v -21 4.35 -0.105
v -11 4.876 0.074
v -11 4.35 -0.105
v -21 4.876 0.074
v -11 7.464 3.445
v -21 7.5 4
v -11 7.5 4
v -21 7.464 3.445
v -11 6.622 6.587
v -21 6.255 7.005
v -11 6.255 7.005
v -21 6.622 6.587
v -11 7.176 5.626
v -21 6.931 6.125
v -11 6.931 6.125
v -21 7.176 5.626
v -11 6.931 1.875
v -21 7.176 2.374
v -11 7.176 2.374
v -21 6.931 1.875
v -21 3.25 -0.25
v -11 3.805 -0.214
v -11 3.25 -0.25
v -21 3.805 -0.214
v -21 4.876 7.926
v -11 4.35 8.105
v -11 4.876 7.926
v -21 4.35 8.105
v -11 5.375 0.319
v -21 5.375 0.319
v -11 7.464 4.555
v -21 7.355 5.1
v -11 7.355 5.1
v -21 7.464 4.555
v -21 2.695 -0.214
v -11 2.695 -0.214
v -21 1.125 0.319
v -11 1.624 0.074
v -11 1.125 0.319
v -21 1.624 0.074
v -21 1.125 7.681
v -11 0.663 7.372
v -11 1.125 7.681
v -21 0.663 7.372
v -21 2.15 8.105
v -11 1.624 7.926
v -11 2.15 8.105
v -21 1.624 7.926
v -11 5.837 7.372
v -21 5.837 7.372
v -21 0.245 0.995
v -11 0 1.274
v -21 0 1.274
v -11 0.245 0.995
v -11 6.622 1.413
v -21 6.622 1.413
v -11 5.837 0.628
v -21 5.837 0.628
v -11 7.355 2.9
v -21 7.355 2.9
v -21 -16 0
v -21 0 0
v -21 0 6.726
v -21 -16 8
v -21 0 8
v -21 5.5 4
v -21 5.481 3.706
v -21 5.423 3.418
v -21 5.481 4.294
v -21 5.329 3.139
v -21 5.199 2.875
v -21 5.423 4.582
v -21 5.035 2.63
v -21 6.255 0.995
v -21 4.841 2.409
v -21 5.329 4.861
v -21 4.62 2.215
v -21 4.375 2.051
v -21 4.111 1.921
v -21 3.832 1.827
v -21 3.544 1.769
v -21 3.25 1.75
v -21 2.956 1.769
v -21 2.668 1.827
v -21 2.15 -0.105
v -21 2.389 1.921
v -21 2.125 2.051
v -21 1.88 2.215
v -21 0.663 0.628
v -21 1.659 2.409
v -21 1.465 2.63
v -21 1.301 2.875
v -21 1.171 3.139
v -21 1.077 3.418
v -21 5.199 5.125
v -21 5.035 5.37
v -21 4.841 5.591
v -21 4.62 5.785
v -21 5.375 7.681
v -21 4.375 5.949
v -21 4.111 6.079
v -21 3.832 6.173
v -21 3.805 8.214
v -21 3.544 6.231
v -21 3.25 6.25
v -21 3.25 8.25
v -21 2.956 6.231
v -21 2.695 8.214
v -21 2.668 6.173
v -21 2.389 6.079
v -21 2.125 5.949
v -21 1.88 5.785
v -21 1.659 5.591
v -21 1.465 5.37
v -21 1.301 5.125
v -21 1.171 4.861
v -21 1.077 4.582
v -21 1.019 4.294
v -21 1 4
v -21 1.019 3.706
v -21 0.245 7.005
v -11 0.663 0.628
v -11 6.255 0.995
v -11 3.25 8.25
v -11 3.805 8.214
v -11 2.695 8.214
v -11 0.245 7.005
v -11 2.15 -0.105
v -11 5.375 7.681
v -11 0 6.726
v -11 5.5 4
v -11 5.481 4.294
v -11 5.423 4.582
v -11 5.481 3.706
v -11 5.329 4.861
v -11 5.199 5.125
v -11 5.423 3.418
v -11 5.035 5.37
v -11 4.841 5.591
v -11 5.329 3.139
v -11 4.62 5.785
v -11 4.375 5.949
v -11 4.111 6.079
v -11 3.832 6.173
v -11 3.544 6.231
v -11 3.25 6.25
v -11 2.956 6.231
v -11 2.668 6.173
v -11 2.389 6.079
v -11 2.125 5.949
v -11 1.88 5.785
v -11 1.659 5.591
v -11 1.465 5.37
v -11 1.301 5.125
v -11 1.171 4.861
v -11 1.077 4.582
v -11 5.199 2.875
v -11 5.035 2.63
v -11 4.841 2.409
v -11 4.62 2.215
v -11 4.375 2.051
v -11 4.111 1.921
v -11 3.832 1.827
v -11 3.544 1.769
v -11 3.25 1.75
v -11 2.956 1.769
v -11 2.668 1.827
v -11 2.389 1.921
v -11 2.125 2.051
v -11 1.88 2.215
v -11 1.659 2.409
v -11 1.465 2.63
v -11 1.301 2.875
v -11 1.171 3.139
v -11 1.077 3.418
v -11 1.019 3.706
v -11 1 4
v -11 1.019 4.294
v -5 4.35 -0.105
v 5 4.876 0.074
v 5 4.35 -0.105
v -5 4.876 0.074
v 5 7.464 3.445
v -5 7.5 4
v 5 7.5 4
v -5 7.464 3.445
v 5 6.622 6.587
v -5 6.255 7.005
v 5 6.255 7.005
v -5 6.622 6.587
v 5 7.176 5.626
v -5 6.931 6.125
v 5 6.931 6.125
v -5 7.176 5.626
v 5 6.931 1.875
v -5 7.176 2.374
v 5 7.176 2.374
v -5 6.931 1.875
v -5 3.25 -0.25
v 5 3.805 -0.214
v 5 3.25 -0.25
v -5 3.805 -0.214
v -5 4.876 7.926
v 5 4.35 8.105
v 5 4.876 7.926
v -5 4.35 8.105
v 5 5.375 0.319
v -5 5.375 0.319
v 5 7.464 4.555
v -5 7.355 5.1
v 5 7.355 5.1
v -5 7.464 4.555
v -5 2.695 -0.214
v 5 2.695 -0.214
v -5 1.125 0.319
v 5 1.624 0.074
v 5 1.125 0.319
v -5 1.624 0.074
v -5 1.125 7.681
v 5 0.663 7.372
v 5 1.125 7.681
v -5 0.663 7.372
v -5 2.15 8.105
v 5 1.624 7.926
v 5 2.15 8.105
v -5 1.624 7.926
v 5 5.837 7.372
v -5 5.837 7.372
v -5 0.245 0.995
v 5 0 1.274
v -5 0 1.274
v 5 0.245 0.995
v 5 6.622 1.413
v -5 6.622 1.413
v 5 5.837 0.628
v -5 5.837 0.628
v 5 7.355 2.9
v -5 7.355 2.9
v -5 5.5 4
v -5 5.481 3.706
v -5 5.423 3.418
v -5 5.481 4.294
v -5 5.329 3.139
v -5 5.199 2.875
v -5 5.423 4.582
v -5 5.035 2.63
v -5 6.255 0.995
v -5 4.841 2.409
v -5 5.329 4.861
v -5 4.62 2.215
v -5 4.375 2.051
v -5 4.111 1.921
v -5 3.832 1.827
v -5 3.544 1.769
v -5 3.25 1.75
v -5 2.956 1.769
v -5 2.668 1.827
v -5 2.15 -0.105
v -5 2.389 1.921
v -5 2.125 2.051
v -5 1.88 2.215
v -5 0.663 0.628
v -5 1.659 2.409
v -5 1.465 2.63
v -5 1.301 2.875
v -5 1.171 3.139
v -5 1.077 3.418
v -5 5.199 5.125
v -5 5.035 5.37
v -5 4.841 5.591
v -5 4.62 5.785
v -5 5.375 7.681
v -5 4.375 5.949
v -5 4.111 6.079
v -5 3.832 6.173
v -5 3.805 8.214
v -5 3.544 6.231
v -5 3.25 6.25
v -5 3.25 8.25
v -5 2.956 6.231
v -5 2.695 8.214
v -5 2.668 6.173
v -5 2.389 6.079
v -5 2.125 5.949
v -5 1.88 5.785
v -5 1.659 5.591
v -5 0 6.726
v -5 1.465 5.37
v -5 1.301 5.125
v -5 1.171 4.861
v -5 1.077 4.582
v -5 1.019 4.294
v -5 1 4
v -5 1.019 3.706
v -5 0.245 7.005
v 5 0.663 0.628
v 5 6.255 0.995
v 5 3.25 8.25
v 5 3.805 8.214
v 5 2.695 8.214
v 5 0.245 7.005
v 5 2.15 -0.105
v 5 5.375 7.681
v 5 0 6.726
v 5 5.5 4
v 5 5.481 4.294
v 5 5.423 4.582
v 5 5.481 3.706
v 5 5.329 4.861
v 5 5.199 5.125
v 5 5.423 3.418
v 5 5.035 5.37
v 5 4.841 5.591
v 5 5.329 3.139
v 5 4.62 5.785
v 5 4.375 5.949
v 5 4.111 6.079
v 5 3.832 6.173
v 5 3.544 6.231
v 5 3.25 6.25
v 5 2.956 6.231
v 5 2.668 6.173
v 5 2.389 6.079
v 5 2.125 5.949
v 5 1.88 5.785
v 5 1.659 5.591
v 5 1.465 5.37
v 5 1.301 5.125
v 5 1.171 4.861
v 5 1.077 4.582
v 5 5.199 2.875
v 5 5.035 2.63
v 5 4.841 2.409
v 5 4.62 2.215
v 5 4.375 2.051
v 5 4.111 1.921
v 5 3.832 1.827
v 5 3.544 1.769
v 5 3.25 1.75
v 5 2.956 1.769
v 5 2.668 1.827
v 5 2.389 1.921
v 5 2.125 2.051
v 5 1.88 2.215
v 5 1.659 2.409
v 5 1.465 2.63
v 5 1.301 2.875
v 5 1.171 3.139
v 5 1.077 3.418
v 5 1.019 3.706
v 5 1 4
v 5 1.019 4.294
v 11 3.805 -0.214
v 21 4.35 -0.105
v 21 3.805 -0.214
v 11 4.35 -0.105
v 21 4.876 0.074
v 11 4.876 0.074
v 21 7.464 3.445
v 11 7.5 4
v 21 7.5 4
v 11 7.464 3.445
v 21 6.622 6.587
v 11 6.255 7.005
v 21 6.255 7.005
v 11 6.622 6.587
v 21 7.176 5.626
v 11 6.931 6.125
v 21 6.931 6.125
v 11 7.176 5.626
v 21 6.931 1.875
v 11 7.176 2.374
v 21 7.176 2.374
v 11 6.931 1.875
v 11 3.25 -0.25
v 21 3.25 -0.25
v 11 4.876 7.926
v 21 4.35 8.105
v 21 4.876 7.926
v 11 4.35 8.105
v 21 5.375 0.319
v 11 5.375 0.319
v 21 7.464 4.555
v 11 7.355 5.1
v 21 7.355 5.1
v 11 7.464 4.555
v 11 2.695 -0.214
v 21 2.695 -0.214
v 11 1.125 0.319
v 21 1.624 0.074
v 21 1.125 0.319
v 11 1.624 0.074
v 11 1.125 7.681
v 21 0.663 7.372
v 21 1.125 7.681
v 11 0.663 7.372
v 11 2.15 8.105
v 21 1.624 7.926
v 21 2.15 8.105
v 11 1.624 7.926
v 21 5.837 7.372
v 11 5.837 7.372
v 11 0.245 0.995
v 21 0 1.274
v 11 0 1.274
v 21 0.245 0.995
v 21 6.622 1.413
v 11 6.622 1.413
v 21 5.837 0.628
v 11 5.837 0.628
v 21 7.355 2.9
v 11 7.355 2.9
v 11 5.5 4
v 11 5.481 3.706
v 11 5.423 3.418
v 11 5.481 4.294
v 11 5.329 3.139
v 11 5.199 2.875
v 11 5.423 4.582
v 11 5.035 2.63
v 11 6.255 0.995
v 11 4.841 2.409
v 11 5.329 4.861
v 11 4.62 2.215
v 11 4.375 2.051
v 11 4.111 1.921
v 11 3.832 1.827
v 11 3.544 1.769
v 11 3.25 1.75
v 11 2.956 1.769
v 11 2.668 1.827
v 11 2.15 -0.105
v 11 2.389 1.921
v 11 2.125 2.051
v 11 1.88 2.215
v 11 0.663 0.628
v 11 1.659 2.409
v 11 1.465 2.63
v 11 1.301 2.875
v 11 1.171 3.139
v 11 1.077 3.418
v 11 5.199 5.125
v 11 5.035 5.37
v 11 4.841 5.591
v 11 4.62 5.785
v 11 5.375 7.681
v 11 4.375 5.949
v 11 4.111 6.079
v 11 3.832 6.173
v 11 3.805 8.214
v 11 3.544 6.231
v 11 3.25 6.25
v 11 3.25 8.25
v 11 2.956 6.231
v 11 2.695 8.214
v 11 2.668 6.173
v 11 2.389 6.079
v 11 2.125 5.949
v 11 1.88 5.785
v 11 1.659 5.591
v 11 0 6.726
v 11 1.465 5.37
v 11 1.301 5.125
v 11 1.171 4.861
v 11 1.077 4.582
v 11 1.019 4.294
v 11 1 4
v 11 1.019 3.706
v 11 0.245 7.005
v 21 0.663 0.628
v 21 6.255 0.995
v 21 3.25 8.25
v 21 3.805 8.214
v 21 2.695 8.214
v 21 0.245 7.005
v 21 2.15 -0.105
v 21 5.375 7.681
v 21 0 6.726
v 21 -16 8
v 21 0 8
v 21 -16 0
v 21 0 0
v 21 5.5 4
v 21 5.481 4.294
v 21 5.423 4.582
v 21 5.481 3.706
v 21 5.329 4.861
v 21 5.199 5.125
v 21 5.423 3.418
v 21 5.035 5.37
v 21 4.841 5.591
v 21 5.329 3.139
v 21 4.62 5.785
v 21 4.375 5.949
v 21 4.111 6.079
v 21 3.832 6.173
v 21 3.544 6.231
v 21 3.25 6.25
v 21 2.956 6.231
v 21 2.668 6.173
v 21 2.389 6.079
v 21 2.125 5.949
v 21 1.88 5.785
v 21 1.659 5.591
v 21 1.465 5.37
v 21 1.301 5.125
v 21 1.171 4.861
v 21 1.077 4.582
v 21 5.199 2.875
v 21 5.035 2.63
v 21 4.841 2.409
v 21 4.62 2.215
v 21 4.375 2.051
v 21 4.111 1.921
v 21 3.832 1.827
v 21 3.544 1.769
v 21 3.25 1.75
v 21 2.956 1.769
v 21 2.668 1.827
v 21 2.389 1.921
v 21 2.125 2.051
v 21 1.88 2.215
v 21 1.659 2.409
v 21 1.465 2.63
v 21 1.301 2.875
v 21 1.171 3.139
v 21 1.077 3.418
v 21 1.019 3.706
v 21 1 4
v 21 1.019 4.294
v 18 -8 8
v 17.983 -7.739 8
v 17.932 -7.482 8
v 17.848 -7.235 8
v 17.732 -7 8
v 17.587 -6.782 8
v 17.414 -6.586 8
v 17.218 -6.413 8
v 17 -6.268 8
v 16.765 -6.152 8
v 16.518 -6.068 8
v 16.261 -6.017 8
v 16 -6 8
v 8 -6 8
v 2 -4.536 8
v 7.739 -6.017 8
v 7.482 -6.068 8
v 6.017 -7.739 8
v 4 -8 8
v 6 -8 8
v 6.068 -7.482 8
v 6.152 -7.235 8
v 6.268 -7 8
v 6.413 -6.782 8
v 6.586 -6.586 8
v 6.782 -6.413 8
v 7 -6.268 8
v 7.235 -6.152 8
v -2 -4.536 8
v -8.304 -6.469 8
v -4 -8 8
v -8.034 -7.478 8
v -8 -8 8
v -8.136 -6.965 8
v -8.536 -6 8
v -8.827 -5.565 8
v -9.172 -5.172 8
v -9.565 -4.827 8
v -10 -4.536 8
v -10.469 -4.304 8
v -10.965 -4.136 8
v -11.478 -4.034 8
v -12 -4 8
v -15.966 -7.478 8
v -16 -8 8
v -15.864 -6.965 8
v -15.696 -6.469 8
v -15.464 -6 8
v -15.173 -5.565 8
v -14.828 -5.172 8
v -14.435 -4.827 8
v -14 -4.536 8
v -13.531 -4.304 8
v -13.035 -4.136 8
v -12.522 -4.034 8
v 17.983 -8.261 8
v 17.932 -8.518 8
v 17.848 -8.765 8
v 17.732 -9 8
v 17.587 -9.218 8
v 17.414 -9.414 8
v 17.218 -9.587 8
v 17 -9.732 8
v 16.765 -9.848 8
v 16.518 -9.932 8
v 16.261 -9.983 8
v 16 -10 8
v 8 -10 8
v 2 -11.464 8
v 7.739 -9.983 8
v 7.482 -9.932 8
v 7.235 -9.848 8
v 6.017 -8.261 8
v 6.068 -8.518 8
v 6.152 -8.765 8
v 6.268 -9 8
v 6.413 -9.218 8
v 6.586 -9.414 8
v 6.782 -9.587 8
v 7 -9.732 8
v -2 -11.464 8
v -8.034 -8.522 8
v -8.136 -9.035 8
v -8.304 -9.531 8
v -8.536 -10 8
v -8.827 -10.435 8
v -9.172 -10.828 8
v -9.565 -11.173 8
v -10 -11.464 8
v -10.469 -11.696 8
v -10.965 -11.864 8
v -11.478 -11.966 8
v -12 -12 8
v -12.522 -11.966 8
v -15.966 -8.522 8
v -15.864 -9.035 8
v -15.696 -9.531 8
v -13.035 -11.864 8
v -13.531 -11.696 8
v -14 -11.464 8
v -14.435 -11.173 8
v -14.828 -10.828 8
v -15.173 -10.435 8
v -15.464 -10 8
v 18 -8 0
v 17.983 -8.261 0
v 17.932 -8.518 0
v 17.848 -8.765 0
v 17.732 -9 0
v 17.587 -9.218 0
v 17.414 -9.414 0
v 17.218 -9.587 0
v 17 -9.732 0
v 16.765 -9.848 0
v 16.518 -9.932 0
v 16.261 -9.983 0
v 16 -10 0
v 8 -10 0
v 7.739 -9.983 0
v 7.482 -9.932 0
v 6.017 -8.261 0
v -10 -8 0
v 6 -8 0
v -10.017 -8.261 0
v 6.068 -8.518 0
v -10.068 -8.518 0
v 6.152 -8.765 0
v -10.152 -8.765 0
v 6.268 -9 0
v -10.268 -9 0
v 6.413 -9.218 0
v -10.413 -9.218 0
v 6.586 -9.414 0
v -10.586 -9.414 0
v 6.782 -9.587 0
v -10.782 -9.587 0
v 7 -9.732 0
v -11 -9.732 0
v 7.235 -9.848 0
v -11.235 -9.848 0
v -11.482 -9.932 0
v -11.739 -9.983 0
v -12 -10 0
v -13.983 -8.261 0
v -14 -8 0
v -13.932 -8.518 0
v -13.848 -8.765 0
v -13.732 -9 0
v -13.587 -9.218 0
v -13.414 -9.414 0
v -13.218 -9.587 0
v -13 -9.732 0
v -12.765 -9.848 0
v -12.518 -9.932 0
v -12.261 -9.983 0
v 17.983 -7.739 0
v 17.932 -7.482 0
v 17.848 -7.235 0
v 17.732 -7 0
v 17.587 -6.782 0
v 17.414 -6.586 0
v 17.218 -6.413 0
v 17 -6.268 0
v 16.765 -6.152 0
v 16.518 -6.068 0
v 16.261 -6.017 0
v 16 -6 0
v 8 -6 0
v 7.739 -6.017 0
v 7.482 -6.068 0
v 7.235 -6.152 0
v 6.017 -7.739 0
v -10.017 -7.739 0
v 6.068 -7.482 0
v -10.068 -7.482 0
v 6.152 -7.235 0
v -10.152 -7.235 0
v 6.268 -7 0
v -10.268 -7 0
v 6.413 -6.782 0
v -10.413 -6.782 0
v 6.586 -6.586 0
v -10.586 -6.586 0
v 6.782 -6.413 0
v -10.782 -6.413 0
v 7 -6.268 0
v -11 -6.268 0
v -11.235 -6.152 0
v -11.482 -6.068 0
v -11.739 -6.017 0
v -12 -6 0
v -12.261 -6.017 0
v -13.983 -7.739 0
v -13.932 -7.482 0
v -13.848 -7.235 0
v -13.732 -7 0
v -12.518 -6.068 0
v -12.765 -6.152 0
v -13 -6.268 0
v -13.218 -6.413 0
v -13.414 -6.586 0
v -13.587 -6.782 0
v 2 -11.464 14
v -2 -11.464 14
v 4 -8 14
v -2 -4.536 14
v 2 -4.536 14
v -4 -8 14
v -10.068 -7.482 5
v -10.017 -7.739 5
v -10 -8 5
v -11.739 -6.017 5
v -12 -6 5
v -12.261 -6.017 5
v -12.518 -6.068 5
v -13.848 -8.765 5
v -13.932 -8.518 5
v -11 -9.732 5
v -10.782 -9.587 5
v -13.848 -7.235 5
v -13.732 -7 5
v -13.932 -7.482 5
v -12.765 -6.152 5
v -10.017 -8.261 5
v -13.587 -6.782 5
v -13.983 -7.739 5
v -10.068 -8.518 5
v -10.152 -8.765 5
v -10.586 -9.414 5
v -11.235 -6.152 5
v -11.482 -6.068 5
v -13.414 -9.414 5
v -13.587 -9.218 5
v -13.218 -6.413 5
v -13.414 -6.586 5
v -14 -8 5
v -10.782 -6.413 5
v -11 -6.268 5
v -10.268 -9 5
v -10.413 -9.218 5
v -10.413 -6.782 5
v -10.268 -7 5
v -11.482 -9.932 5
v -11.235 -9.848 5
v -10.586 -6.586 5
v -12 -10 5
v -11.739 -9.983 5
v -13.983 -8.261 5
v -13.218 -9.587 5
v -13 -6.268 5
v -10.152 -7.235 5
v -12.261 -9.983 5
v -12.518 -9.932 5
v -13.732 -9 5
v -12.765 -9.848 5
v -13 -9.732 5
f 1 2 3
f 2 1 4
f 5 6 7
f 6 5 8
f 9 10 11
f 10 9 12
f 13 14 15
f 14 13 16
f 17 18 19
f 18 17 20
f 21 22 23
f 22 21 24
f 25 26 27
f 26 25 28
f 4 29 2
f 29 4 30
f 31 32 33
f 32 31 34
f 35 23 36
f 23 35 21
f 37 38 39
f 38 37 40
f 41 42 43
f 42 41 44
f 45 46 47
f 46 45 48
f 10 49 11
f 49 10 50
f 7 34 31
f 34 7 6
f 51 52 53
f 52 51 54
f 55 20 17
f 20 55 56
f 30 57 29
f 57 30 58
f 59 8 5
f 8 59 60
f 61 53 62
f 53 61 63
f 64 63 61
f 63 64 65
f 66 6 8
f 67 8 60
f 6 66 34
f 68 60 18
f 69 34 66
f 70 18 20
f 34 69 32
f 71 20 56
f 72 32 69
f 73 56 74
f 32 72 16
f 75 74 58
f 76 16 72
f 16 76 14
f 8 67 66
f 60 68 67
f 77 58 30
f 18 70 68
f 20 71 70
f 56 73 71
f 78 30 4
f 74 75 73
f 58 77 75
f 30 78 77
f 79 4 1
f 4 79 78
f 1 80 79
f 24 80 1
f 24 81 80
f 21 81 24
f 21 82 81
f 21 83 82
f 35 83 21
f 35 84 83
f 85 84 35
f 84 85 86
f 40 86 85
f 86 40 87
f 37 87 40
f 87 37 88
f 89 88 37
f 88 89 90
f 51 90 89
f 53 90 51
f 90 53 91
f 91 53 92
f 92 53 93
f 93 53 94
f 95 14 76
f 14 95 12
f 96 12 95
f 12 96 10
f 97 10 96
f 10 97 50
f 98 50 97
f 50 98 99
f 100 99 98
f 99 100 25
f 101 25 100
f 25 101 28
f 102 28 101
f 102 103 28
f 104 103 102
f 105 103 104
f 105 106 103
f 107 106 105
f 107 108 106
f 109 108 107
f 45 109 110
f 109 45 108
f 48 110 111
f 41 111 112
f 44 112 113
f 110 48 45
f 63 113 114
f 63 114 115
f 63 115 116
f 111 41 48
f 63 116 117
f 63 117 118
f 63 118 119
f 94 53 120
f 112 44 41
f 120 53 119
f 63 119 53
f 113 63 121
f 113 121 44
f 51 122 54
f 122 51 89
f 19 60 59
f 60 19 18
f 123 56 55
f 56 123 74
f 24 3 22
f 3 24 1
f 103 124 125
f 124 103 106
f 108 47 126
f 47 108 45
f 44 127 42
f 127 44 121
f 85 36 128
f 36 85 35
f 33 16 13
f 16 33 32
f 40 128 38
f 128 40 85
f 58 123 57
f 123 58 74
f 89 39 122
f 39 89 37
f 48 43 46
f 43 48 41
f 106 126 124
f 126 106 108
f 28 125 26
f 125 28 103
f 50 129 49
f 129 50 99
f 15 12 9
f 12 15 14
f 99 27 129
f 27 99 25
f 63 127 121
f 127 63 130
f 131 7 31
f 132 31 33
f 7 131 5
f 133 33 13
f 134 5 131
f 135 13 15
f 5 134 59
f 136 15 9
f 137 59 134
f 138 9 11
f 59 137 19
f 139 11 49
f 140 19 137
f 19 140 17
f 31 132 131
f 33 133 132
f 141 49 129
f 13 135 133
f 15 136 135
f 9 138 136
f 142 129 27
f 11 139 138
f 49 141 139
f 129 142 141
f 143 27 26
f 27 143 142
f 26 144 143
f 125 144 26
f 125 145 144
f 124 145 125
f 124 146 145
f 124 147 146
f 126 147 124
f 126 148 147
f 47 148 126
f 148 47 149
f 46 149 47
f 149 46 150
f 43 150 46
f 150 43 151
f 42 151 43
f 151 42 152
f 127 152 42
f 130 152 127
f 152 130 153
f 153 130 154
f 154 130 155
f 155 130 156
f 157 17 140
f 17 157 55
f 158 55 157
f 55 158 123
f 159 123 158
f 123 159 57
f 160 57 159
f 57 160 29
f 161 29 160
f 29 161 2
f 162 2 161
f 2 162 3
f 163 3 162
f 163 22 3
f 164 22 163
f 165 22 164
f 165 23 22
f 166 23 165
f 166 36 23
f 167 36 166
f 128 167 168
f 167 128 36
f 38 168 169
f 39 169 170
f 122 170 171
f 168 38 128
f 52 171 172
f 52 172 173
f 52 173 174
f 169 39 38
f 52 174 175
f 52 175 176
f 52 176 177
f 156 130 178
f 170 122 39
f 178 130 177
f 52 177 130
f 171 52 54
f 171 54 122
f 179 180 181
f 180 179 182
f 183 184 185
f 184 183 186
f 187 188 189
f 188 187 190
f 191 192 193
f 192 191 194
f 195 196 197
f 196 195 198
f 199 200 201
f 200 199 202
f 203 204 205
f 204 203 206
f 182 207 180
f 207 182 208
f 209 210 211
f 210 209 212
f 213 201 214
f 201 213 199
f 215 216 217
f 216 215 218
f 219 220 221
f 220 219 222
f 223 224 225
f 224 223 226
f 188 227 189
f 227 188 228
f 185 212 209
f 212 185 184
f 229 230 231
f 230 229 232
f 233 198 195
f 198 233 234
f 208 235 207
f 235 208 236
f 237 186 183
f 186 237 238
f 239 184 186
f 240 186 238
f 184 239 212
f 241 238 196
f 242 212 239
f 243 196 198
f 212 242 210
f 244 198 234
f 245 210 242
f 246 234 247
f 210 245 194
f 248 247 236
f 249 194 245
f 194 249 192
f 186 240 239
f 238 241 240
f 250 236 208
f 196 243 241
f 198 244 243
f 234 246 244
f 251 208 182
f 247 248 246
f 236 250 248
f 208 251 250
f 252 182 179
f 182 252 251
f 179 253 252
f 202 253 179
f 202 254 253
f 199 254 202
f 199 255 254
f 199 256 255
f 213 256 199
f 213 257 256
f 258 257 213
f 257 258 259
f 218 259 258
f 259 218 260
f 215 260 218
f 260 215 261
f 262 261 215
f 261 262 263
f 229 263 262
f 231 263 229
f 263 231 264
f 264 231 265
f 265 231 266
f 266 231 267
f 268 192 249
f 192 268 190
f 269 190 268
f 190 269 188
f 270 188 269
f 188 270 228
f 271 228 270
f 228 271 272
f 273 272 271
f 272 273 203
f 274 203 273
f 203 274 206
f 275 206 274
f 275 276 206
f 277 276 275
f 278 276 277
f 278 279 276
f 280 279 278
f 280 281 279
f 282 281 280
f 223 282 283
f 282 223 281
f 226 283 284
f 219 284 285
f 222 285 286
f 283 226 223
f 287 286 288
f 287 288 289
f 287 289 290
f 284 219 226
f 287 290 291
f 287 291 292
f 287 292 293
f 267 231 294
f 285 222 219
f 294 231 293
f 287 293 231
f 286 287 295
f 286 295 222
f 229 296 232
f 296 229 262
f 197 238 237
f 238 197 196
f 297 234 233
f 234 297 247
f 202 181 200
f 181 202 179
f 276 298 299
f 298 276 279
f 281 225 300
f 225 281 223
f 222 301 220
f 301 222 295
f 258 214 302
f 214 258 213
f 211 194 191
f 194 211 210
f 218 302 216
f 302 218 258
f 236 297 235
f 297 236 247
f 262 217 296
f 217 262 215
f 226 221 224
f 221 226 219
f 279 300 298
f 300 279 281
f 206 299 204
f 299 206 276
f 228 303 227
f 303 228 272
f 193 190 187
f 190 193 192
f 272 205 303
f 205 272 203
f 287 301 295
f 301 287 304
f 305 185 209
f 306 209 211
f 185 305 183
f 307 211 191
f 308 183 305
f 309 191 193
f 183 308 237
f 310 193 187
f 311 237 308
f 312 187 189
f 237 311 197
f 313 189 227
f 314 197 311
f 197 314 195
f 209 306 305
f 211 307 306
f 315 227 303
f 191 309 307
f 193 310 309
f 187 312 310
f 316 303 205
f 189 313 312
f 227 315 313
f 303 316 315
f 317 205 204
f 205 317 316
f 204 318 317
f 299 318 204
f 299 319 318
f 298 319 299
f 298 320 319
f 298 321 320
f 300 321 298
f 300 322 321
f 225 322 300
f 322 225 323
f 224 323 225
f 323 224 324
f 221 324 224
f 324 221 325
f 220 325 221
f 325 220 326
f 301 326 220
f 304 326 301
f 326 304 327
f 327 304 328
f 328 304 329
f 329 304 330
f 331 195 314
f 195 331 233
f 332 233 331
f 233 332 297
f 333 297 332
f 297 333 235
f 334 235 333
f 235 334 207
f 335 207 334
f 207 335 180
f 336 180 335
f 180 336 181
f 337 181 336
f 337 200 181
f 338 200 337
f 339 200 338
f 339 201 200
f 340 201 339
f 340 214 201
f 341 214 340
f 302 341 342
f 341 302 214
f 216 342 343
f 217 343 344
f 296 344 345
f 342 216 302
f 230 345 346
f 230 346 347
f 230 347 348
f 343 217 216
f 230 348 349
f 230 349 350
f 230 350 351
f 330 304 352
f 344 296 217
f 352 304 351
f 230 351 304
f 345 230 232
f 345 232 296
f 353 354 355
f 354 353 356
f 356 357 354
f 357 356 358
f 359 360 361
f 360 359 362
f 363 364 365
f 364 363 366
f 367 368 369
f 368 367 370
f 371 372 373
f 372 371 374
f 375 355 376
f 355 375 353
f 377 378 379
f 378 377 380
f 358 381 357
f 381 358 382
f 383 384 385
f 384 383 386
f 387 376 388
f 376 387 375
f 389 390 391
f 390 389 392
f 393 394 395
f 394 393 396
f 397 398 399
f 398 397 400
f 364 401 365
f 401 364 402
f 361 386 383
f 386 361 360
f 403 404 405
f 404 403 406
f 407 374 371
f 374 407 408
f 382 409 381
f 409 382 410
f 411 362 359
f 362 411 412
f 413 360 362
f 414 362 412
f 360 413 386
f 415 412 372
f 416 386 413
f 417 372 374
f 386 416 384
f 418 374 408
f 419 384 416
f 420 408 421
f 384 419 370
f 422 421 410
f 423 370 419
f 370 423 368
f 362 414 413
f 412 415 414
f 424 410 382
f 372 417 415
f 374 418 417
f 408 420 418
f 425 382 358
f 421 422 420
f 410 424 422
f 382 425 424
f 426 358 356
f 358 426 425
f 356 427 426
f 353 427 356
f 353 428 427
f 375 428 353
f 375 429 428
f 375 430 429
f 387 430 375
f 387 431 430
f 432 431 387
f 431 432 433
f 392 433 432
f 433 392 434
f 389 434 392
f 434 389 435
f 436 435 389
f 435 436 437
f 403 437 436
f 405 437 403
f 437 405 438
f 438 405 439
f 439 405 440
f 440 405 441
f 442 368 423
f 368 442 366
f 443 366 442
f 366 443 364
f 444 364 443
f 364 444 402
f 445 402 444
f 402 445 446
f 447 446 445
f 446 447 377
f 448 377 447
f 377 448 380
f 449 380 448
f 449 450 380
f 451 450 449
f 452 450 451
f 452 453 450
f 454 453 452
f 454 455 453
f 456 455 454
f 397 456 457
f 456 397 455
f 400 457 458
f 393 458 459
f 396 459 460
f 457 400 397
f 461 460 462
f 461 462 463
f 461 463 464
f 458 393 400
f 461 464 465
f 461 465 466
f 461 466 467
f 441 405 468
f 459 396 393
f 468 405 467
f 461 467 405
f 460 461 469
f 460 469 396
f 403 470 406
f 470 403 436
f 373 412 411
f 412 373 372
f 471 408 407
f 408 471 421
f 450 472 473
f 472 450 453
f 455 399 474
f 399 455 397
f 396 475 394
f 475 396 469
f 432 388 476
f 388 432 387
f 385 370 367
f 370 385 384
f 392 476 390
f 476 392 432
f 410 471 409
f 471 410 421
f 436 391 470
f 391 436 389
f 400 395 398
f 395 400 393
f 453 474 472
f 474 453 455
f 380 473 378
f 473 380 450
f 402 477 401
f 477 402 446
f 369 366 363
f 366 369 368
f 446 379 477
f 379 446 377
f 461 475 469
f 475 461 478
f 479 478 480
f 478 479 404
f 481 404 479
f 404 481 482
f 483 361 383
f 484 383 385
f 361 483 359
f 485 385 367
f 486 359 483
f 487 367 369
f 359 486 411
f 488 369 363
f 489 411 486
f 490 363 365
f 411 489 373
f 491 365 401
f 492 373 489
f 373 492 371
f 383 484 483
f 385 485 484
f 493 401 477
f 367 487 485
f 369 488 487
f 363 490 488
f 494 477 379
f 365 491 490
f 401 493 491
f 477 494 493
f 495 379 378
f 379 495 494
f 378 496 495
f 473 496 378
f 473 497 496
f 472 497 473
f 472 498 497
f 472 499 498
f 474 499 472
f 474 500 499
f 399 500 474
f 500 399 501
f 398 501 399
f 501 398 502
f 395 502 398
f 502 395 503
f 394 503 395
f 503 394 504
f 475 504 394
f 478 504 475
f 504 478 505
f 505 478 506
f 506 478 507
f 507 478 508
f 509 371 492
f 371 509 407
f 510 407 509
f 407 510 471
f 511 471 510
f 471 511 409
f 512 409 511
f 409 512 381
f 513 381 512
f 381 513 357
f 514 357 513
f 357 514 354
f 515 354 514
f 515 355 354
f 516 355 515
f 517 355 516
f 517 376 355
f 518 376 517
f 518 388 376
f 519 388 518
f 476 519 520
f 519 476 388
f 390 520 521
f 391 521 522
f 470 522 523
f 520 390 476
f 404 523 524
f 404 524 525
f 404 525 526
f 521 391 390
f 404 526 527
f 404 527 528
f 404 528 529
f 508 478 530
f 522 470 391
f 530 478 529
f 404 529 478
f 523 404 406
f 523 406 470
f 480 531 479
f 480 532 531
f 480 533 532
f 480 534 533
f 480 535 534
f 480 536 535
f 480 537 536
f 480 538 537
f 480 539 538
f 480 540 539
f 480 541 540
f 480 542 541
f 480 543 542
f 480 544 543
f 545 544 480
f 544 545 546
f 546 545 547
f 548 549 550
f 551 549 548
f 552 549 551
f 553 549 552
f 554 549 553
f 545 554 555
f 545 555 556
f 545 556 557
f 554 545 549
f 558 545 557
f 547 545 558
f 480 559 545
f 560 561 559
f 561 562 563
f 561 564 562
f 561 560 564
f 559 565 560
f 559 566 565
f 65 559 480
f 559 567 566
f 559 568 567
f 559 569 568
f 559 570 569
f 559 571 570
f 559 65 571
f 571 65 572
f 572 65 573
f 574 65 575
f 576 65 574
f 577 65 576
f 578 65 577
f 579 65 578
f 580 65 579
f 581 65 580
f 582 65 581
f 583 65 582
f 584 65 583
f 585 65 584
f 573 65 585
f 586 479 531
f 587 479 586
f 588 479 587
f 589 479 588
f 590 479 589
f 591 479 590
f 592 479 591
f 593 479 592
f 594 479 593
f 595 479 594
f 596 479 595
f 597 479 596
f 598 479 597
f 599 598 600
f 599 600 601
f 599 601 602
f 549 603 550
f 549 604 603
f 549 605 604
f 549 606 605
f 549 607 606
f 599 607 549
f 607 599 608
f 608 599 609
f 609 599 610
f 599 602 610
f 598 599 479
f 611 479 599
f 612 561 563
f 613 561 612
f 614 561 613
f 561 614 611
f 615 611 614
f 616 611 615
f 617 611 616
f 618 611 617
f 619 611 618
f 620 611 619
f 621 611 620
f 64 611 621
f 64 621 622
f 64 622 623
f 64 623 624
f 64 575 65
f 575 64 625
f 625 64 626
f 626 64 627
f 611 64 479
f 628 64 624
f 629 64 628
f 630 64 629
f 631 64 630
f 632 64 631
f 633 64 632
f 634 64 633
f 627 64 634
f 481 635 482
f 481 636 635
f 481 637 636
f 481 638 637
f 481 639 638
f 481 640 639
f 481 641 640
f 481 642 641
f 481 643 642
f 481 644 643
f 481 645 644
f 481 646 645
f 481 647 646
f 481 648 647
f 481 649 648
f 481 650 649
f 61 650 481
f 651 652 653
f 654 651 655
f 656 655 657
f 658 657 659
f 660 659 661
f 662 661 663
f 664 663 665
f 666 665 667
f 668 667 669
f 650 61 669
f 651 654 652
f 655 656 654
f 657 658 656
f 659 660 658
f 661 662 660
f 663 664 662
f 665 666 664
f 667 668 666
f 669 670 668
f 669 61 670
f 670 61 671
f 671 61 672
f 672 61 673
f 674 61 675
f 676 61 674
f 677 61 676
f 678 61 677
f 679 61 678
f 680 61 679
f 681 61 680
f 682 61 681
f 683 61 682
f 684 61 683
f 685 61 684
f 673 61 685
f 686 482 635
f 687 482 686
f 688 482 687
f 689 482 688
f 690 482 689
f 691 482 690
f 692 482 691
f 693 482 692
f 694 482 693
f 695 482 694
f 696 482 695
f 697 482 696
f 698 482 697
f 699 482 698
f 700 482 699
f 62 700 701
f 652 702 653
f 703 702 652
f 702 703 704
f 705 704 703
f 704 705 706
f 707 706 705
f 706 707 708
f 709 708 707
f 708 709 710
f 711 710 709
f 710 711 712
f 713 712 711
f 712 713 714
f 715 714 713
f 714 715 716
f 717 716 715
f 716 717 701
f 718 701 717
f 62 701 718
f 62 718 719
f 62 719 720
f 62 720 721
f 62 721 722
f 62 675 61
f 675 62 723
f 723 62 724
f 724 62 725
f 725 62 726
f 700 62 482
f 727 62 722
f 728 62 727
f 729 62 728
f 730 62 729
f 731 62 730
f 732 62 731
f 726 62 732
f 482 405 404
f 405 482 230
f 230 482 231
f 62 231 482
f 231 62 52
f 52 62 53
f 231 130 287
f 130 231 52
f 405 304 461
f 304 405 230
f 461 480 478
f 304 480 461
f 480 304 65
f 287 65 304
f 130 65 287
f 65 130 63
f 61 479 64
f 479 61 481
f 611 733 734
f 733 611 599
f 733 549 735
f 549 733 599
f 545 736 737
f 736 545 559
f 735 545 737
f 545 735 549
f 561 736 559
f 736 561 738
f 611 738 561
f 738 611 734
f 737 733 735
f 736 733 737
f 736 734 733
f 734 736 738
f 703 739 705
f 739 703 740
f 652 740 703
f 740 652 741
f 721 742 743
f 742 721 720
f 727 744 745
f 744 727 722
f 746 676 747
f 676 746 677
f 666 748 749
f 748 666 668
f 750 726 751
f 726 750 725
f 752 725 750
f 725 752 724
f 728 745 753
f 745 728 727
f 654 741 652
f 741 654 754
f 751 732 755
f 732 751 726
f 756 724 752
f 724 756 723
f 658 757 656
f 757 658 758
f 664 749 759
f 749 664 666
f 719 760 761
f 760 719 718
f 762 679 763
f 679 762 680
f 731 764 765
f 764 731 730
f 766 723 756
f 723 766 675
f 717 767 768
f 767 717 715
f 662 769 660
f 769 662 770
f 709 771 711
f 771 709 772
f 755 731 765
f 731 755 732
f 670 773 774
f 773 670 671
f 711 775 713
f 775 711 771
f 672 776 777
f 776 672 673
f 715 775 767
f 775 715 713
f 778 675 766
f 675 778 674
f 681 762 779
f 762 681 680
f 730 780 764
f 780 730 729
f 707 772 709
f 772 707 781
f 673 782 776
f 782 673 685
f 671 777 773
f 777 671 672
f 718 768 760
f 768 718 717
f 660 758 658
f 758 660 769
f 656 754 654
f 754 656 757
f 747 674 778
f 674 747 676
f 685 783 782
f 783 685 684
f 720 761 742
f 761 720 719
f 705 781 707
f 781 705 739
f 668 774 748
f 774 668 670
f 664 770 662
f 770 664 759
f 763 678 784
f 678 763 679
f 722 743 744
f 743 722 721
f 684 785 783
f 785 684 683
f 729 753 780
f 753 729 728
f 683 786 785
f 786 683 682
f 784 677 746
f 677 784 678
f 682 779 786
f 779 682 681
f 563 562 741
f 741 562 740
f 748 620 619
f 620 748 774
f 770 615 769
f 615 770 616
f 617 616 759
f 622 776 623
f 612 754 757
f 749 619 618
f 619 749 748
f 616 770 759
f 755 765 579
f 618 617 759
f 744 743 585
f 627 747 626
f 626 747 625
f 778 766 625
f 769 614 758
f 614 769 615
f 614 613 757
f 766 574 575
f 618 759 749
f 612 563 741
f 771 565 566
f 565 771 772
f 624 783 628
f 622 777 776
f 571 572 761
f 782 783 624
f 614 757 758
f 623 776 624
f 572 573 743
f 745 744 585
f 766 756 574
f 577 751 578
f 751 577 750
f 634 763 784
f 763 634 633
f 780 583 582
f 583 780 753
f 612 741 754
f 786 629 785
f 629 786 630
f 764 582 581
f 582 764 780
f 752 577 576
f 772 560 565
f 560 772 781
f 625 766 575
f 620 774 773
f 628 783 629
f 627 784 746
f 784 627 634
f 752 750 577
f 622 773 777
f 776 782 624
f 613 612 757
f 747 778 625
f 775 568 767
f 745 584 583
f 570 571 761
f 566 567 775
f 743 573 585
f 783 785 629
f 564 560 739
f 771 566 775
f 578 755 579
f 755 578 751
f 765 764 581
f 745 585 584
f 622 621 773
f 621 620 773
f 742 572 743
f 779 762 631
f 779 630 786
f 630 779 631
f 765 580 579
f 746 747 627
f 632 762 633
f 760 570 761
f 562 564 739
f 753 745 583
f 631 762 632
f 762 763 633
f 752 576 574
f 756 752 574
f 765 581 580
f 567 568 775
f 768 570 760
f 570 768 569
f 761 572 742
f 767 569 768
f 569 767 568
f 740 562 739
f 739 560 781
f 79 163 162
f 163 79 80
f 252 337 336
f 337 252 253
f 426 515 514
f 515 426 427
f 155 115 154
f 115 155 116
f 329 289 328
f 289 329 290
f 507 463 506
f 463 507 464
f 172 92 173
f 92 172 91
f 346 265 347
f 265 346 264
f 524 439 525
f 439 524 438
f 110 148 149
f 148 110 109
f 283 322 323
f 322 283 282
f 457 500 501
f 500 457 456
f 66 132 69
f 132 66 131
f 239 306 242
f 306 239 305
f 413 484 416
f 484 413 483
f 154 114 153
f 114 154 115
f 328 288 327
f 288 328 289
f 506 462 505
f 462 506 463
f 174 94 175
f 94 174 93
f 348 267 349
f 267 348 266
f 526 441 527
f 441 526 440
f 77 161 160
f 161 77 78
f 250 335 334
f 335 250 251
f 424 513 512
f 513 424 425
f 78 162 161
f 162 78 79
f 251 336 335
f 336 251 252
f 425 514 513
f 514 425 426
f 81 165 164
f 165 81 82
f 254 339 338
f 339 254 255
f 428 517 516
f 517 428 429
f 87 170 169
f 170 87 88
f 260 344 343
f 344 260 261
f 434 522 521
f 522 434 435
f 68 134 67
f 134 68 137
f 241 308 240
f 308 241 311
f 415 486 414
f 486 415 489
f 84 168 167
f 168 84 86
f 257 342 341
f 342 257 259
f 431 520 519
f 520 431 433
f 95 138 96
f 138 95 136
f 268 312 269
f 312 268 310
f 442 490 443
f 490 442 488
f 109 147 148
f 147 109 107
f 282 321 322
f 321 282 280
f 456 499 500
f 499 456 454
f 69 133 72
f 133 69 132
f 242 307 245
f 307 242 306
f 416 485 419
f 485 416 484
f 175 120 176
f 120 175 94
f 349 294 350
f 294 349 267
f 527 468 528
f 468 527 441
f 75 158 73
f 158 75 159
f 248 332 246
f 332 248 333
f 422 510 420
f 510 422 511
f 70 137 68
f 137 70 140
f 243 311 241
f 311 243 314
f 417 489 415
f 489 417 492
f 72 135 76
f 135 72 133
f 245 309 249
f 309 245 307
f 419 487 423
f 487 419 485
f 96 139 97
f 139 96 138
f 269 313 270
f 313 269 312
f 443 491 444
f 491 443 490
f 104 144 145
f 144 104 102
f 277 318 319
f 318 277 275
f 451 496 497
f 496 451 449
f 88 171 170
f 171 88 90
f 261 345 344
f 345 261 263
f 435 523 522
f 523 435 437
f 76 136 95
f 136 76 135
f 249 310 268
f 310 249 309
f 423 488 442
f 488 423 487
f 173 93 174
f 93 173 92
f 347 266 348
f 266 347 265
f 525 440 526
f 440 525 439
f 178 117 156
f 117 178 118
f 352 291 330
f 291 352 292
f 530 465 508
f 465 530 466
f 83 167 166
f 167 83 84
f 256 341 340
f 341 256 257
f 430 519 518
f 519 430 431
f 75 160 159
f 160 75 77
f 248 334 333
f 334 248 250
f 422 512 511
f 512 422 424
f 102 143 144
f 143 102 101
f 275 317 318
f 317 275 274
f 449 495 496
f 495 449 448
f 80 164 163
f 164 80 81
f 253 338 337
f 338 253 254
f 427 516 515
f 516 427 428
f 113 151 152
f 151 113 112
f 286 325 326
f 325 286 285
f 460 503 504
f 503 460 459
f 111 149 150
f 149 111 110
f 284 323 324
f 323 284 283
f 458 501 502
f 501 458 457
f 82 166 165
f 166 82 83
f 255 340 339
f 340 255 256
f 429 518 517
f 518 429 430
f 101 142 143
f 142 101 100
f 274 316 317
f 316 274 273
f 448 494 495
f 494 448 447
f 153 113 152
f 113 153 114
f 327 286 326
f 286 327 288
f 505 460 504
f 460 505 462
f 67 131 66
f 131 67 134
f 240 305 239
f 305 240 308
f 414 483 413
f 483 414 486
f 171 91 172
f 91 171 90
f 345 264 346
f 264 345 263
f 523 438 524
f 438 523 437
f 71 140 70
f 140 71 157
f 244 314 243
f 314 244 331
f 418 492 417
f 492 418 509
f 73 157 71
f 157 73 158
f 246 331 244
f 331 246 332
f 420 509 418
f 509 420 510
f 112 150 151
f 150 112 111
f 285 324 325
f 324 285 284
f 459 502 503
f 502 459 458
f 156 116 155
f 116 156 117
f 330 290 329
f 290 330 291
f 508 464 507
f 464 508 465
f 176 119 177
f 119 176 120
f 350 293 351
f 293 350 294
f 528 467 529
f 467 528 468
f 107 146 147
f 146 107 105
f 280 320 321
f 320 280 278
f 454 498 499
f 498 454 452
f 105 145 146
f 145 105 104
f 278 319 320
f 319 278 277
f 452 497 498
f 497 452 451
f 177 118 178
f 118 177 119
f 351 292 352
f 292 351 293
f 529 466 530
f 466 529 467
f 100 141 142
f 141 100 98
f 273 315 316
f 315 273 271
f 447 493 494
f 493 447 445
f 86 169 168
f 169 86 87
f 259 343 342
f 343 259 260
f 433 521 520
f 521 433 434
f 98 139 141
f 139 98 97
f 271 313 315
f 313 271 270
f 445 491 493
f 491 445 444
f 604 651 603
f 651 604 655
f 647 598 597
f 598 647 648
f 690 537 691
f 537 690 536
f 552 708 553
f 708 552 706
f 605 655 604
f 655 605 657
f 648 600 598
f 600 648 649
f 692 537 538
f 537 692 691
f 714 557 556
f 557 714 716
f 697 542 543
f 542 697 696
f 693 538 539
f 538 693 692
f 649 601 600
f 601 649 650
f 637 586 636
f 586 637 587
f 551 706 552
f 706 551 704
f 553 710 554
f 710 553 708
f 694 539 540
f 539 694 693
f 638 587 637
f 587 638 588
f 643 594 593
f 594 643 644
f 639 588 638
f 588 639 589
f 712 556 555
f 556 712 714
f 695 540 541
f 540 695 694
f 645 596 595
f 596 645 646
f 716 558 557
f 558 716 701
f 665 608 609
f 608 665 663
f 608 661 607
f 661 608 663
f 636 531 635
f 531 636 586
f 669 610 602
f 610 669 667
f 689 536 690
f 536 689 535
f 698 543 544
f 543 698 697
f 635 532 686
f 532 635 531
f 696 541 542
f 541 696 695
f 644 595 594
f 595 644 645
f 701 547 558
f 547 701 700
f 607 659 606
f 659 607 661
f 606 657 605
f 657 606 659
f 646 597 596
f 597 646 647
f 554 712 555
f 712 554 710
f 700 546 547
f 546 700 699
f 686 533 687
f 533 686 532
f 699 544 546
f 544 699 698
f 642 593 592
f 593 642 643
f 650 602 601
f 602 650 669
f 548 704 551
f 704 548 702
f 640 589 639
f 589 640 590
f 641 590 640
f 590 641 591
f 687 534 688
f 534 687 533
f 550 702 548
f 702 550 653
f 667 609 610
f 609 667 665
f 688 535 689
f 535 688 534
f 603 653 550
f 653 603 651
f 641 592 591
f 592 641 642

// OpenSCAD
// Surface-inspection fixture — a three-knuckle butt hinge leaf (S2-3).
//
// This is a HAND-AUTHORED fixture, not agent output — same rationale as
// `evals/scenario-a2/fixture/clamp.scad`: cylindrical-surface recognition has
// to be tested against a reproducible closed-form model, not something an
// agent re-authors run to run. It follows the clamp's conventions (mm,
// Customizer annotations, parameters first, helpers second, geometry last)
// and adds a SECOND, topologically distinct fixture: knuckles along X instead
// of a bore along Z, a countersink whose cone must refuse while its straight
// wall recognizes, an intentionally too-coarse hex boss, and a stadium slot
// whose tangent flats must refuse as non-circular. `pin_d` and `knuckle_wall`
// are the only dimensions that vary across the test samples; every other
// dimension below is a fixed constant chosen to keep the fused-solid and
// feature-isolation proofs true for ANY legal `pin_d`/`knuckle_wall` pair.
//
// Properties the harness relies on:
//   - one fused solid (components == 1) at every legal `pin_d`/`knuckle_wall`
//     pair. Each knuckle overlaps the leaf by exactly 1mm regardless of the
//     knuckle radius `r = pin_d/2 + knuckle_wall` (the clamp's overlap trick:
//     the knuckle's axis sits at `y = r - 1`, so its near edge is always at
//     `y = -1`, 1mm inside the leaf slab which spans `y ∈ [-leaf_width, 0]`);
//   - the bore never touches the leaf slab at any legal value: the bore's
//     near edge sits at `y = knuckle_wall - 1`, independent of `pin_d`, and
//     `knuckle_wall >= 1.5` keeps that >= 0.5mm on the positive (leaf-facing)
//     side of `y = 0` — the bore only ever removes knuckle material;
//   - three coaxial knuckle bores, `d = pin_d`, separated by real `gap`s along
//     X, so each is its own surface region (a genus-raising, not just convex,
//     topology, unlike the clamp's single Z bore);
//   - knuckle outside diameter `pin_d + 2 * knuckle_wall`, coaxial with the
//     bore, so hole/outside classification has a real pair to distinguish;
//   - the countersunk mounting hole's straight cylindrical wall is
//     `leaf_thick - cs_depth = 5mm` — fixed, since neither `leaf_thick` nor
//     `cs_depth` depends on `pin_d`/`knuckle_wall` — comfortably over the 2mm
//     the harness requires to click it apart from the cone;
//   - the hex boss is `$fn = 6`; every other solid renders at `$fn = 48`;
//   - the stadium slot is a `hull()` of two same-height, Z-axis cylinders, so
//     its two arcs and two flats are one C1-continuous vertical surface —
//     there is no sharp edge between an arc and a flat for region growth to
//     stop at, so the whole slot wall is one region no circle fits;
//   - the three added features (countersink, hex boss, slot) sit on the flat
//     leaf face at `y = -leaf_width / 2 = -8`, at least 3mm clear of the
//     knuckle-overlap sliver (`y ∈ [-1, 0]`) and of each other and the leaf
//     edges, independent of `pin_d`/`knuckle_wall` (none of their placement
//     or size depends on either);
//   - closed-form bbox as a function of `r = pin_d/2 + knuckle_wall`:
//       x: [-21, 21]                         (constant — knuckle_len/gap/leaf
//                                              length never vary)
//       y: [-16, 2r - 1]                     (min constant; max grows with r)
//       z: [min(0, 4 - r), 14]               (max constant — the hex boss
//                                              always tops out higher than the
//                                              tallest knuckle in-range; min
//                                              drops below 0 once r > 4)
//
// SPDX-License-Identifier: GPL-3.0-or-later

/* [Hinge] */
// Knuckle bore / pin diameter, through all three knuckles (mm)
pin_d = 4.5;        // [3:0.5:6]
// Knuckle wall thickness around the bore (mm)
knuckle_wall = 2;   // [1.5:0.5:3.5]

/* [Quality] */
// Facets per full circle (everything except the hex boss, which is fixed $fn = 6)
$fn = 48;           // [24:8:96]

// ---- Helpers (fixed constants; none of these vary across test samples) ----

// Knuckle layout along X: length of each knuckle and the real gap between them.
knuckle_len = 10;
gap = 6;
// Total leaf length along X, and the three knuckle centers it implies.
leaf_len = 3 * knuckle_len + 2 * gap;          // 42
knuckle_x = [-(knuckle_len + gap), 0, (knuckle_len + gap)]; // [-16, 0, 16]

// Leaf slab: x spans leaf_len, y is the leaf's depth, z is its thickness.
leaf_width = 16;
leaf_thick = 8;

// Knuckle geometry, derived from the two real parameters.
knuckle_r = pin_d / 2 + knuckle_wall;           // outside radius
knuckle_y = knuckle_r - 1;                      // axis Y: always 1mm overlap
knuckle_z = leaf_thick / 2;                     // axis Z: centered on the leaf

// Countersunk mounting hole (axis Z), fixed dimensions.
hole_d = 4;      // straight bore diameter
cs_dia = 8;      // countersink diameter at the leaf's top face
cs_depth = 3;    // countersink cone depth -> straight wall = leaf_thick - cs_depth = 5mm
cs_x = -12;
cs_y = -leaf_width / 2;

// Hex boss (fixed $fn = 6), fixed dimensions.
hex_d = 8;
hex_h = 6;
hex_x = 0;
hex_y = -leaf_width / 2;

// Stadium slot (vertical, through the leaf), fixed dimensions.
slot_len = 12;   // end-to-end length
slot_w = 4;      // width (= end-cap diameter)
slot_x = 12;
slot_y = -leaf_width / 2;

// ---- Geometry ----

module leaf_slab() {
  translate([-leaf_len / 2, -leaf_width, 0])
    cube([leaf_len, leaf_width, leaf_thick]);
}

module knuckle_solid(x) {
  translate([x, knuckle_y, knuckle_z])
    rotate([0, 90, 0])
      cylinder(h = knuckle_len, r = knuckle_r, center = true);
}

module knuckle_bore() {
  // Runs the full leaf length plus overhang so every knuckle (and the gaps,
  // where it is a no-op — see header) gets a clean coaxial through-hole.
  translate([0, knuckle_y, knuckle_z])
    rotate([0, 90, 0])
      cylinder(h = leaf_len + 4, d = pin_d, center = true);
}

module hex_boss() {
  // Embedded 0.5mm into the slab so the union has a real overlap, not a
  // coincident face.
  translate([hex_x, hex_y, leaf_thick - 0.5])
    cylinder(h = hex_h + 0.5, d = hex_d, $fn = 6);
}

module countersink() {
  translate([cs_x, cs_y, 0]) {
    // Straight bore, 1mm past the bottom face for a clean through-cut.
    translate([0, 0, -1])
      cylinder(h = (leaf_thick - cs_depth) + 1, d = hole_d);
    // Countersink cone: bottom = hole_d at the top of the straight bore,
    // top = cs_dia exactly at the leaf's real top face (no overhang needed —
    // this face is the countersink's true visible opening).
    translate([0, 0, leaf_thick - cs_depth])
      cylinder(h = cs_depth, d1 = hole_d, d2 = cs_dia);
  }
}

module stadium_slot() {
  // hull() of two same-height, same-radius Z-axis cylinders: a C1-continuous
  // stadium wall (see header) that runs the full leaf thickness plus overhang.
  translate([slot_x, slot_y, 0])
    hull() {
      for (dx = [-1, 1])
        translate([dx * (slot_len - slot_w) / 2, 0, -1])
          cylinder(h = leaf_thick + 2, d = slot_w);
    }
}

module hinge() {
  difference() {
    union() {
      leaf_slab();
      for (x = knuckle_x) knuckle_solid(x);
      hex_boss();
    }
    knuckle_bore();
    countersink();
    stadium_slot();
  }
}

hinge();
